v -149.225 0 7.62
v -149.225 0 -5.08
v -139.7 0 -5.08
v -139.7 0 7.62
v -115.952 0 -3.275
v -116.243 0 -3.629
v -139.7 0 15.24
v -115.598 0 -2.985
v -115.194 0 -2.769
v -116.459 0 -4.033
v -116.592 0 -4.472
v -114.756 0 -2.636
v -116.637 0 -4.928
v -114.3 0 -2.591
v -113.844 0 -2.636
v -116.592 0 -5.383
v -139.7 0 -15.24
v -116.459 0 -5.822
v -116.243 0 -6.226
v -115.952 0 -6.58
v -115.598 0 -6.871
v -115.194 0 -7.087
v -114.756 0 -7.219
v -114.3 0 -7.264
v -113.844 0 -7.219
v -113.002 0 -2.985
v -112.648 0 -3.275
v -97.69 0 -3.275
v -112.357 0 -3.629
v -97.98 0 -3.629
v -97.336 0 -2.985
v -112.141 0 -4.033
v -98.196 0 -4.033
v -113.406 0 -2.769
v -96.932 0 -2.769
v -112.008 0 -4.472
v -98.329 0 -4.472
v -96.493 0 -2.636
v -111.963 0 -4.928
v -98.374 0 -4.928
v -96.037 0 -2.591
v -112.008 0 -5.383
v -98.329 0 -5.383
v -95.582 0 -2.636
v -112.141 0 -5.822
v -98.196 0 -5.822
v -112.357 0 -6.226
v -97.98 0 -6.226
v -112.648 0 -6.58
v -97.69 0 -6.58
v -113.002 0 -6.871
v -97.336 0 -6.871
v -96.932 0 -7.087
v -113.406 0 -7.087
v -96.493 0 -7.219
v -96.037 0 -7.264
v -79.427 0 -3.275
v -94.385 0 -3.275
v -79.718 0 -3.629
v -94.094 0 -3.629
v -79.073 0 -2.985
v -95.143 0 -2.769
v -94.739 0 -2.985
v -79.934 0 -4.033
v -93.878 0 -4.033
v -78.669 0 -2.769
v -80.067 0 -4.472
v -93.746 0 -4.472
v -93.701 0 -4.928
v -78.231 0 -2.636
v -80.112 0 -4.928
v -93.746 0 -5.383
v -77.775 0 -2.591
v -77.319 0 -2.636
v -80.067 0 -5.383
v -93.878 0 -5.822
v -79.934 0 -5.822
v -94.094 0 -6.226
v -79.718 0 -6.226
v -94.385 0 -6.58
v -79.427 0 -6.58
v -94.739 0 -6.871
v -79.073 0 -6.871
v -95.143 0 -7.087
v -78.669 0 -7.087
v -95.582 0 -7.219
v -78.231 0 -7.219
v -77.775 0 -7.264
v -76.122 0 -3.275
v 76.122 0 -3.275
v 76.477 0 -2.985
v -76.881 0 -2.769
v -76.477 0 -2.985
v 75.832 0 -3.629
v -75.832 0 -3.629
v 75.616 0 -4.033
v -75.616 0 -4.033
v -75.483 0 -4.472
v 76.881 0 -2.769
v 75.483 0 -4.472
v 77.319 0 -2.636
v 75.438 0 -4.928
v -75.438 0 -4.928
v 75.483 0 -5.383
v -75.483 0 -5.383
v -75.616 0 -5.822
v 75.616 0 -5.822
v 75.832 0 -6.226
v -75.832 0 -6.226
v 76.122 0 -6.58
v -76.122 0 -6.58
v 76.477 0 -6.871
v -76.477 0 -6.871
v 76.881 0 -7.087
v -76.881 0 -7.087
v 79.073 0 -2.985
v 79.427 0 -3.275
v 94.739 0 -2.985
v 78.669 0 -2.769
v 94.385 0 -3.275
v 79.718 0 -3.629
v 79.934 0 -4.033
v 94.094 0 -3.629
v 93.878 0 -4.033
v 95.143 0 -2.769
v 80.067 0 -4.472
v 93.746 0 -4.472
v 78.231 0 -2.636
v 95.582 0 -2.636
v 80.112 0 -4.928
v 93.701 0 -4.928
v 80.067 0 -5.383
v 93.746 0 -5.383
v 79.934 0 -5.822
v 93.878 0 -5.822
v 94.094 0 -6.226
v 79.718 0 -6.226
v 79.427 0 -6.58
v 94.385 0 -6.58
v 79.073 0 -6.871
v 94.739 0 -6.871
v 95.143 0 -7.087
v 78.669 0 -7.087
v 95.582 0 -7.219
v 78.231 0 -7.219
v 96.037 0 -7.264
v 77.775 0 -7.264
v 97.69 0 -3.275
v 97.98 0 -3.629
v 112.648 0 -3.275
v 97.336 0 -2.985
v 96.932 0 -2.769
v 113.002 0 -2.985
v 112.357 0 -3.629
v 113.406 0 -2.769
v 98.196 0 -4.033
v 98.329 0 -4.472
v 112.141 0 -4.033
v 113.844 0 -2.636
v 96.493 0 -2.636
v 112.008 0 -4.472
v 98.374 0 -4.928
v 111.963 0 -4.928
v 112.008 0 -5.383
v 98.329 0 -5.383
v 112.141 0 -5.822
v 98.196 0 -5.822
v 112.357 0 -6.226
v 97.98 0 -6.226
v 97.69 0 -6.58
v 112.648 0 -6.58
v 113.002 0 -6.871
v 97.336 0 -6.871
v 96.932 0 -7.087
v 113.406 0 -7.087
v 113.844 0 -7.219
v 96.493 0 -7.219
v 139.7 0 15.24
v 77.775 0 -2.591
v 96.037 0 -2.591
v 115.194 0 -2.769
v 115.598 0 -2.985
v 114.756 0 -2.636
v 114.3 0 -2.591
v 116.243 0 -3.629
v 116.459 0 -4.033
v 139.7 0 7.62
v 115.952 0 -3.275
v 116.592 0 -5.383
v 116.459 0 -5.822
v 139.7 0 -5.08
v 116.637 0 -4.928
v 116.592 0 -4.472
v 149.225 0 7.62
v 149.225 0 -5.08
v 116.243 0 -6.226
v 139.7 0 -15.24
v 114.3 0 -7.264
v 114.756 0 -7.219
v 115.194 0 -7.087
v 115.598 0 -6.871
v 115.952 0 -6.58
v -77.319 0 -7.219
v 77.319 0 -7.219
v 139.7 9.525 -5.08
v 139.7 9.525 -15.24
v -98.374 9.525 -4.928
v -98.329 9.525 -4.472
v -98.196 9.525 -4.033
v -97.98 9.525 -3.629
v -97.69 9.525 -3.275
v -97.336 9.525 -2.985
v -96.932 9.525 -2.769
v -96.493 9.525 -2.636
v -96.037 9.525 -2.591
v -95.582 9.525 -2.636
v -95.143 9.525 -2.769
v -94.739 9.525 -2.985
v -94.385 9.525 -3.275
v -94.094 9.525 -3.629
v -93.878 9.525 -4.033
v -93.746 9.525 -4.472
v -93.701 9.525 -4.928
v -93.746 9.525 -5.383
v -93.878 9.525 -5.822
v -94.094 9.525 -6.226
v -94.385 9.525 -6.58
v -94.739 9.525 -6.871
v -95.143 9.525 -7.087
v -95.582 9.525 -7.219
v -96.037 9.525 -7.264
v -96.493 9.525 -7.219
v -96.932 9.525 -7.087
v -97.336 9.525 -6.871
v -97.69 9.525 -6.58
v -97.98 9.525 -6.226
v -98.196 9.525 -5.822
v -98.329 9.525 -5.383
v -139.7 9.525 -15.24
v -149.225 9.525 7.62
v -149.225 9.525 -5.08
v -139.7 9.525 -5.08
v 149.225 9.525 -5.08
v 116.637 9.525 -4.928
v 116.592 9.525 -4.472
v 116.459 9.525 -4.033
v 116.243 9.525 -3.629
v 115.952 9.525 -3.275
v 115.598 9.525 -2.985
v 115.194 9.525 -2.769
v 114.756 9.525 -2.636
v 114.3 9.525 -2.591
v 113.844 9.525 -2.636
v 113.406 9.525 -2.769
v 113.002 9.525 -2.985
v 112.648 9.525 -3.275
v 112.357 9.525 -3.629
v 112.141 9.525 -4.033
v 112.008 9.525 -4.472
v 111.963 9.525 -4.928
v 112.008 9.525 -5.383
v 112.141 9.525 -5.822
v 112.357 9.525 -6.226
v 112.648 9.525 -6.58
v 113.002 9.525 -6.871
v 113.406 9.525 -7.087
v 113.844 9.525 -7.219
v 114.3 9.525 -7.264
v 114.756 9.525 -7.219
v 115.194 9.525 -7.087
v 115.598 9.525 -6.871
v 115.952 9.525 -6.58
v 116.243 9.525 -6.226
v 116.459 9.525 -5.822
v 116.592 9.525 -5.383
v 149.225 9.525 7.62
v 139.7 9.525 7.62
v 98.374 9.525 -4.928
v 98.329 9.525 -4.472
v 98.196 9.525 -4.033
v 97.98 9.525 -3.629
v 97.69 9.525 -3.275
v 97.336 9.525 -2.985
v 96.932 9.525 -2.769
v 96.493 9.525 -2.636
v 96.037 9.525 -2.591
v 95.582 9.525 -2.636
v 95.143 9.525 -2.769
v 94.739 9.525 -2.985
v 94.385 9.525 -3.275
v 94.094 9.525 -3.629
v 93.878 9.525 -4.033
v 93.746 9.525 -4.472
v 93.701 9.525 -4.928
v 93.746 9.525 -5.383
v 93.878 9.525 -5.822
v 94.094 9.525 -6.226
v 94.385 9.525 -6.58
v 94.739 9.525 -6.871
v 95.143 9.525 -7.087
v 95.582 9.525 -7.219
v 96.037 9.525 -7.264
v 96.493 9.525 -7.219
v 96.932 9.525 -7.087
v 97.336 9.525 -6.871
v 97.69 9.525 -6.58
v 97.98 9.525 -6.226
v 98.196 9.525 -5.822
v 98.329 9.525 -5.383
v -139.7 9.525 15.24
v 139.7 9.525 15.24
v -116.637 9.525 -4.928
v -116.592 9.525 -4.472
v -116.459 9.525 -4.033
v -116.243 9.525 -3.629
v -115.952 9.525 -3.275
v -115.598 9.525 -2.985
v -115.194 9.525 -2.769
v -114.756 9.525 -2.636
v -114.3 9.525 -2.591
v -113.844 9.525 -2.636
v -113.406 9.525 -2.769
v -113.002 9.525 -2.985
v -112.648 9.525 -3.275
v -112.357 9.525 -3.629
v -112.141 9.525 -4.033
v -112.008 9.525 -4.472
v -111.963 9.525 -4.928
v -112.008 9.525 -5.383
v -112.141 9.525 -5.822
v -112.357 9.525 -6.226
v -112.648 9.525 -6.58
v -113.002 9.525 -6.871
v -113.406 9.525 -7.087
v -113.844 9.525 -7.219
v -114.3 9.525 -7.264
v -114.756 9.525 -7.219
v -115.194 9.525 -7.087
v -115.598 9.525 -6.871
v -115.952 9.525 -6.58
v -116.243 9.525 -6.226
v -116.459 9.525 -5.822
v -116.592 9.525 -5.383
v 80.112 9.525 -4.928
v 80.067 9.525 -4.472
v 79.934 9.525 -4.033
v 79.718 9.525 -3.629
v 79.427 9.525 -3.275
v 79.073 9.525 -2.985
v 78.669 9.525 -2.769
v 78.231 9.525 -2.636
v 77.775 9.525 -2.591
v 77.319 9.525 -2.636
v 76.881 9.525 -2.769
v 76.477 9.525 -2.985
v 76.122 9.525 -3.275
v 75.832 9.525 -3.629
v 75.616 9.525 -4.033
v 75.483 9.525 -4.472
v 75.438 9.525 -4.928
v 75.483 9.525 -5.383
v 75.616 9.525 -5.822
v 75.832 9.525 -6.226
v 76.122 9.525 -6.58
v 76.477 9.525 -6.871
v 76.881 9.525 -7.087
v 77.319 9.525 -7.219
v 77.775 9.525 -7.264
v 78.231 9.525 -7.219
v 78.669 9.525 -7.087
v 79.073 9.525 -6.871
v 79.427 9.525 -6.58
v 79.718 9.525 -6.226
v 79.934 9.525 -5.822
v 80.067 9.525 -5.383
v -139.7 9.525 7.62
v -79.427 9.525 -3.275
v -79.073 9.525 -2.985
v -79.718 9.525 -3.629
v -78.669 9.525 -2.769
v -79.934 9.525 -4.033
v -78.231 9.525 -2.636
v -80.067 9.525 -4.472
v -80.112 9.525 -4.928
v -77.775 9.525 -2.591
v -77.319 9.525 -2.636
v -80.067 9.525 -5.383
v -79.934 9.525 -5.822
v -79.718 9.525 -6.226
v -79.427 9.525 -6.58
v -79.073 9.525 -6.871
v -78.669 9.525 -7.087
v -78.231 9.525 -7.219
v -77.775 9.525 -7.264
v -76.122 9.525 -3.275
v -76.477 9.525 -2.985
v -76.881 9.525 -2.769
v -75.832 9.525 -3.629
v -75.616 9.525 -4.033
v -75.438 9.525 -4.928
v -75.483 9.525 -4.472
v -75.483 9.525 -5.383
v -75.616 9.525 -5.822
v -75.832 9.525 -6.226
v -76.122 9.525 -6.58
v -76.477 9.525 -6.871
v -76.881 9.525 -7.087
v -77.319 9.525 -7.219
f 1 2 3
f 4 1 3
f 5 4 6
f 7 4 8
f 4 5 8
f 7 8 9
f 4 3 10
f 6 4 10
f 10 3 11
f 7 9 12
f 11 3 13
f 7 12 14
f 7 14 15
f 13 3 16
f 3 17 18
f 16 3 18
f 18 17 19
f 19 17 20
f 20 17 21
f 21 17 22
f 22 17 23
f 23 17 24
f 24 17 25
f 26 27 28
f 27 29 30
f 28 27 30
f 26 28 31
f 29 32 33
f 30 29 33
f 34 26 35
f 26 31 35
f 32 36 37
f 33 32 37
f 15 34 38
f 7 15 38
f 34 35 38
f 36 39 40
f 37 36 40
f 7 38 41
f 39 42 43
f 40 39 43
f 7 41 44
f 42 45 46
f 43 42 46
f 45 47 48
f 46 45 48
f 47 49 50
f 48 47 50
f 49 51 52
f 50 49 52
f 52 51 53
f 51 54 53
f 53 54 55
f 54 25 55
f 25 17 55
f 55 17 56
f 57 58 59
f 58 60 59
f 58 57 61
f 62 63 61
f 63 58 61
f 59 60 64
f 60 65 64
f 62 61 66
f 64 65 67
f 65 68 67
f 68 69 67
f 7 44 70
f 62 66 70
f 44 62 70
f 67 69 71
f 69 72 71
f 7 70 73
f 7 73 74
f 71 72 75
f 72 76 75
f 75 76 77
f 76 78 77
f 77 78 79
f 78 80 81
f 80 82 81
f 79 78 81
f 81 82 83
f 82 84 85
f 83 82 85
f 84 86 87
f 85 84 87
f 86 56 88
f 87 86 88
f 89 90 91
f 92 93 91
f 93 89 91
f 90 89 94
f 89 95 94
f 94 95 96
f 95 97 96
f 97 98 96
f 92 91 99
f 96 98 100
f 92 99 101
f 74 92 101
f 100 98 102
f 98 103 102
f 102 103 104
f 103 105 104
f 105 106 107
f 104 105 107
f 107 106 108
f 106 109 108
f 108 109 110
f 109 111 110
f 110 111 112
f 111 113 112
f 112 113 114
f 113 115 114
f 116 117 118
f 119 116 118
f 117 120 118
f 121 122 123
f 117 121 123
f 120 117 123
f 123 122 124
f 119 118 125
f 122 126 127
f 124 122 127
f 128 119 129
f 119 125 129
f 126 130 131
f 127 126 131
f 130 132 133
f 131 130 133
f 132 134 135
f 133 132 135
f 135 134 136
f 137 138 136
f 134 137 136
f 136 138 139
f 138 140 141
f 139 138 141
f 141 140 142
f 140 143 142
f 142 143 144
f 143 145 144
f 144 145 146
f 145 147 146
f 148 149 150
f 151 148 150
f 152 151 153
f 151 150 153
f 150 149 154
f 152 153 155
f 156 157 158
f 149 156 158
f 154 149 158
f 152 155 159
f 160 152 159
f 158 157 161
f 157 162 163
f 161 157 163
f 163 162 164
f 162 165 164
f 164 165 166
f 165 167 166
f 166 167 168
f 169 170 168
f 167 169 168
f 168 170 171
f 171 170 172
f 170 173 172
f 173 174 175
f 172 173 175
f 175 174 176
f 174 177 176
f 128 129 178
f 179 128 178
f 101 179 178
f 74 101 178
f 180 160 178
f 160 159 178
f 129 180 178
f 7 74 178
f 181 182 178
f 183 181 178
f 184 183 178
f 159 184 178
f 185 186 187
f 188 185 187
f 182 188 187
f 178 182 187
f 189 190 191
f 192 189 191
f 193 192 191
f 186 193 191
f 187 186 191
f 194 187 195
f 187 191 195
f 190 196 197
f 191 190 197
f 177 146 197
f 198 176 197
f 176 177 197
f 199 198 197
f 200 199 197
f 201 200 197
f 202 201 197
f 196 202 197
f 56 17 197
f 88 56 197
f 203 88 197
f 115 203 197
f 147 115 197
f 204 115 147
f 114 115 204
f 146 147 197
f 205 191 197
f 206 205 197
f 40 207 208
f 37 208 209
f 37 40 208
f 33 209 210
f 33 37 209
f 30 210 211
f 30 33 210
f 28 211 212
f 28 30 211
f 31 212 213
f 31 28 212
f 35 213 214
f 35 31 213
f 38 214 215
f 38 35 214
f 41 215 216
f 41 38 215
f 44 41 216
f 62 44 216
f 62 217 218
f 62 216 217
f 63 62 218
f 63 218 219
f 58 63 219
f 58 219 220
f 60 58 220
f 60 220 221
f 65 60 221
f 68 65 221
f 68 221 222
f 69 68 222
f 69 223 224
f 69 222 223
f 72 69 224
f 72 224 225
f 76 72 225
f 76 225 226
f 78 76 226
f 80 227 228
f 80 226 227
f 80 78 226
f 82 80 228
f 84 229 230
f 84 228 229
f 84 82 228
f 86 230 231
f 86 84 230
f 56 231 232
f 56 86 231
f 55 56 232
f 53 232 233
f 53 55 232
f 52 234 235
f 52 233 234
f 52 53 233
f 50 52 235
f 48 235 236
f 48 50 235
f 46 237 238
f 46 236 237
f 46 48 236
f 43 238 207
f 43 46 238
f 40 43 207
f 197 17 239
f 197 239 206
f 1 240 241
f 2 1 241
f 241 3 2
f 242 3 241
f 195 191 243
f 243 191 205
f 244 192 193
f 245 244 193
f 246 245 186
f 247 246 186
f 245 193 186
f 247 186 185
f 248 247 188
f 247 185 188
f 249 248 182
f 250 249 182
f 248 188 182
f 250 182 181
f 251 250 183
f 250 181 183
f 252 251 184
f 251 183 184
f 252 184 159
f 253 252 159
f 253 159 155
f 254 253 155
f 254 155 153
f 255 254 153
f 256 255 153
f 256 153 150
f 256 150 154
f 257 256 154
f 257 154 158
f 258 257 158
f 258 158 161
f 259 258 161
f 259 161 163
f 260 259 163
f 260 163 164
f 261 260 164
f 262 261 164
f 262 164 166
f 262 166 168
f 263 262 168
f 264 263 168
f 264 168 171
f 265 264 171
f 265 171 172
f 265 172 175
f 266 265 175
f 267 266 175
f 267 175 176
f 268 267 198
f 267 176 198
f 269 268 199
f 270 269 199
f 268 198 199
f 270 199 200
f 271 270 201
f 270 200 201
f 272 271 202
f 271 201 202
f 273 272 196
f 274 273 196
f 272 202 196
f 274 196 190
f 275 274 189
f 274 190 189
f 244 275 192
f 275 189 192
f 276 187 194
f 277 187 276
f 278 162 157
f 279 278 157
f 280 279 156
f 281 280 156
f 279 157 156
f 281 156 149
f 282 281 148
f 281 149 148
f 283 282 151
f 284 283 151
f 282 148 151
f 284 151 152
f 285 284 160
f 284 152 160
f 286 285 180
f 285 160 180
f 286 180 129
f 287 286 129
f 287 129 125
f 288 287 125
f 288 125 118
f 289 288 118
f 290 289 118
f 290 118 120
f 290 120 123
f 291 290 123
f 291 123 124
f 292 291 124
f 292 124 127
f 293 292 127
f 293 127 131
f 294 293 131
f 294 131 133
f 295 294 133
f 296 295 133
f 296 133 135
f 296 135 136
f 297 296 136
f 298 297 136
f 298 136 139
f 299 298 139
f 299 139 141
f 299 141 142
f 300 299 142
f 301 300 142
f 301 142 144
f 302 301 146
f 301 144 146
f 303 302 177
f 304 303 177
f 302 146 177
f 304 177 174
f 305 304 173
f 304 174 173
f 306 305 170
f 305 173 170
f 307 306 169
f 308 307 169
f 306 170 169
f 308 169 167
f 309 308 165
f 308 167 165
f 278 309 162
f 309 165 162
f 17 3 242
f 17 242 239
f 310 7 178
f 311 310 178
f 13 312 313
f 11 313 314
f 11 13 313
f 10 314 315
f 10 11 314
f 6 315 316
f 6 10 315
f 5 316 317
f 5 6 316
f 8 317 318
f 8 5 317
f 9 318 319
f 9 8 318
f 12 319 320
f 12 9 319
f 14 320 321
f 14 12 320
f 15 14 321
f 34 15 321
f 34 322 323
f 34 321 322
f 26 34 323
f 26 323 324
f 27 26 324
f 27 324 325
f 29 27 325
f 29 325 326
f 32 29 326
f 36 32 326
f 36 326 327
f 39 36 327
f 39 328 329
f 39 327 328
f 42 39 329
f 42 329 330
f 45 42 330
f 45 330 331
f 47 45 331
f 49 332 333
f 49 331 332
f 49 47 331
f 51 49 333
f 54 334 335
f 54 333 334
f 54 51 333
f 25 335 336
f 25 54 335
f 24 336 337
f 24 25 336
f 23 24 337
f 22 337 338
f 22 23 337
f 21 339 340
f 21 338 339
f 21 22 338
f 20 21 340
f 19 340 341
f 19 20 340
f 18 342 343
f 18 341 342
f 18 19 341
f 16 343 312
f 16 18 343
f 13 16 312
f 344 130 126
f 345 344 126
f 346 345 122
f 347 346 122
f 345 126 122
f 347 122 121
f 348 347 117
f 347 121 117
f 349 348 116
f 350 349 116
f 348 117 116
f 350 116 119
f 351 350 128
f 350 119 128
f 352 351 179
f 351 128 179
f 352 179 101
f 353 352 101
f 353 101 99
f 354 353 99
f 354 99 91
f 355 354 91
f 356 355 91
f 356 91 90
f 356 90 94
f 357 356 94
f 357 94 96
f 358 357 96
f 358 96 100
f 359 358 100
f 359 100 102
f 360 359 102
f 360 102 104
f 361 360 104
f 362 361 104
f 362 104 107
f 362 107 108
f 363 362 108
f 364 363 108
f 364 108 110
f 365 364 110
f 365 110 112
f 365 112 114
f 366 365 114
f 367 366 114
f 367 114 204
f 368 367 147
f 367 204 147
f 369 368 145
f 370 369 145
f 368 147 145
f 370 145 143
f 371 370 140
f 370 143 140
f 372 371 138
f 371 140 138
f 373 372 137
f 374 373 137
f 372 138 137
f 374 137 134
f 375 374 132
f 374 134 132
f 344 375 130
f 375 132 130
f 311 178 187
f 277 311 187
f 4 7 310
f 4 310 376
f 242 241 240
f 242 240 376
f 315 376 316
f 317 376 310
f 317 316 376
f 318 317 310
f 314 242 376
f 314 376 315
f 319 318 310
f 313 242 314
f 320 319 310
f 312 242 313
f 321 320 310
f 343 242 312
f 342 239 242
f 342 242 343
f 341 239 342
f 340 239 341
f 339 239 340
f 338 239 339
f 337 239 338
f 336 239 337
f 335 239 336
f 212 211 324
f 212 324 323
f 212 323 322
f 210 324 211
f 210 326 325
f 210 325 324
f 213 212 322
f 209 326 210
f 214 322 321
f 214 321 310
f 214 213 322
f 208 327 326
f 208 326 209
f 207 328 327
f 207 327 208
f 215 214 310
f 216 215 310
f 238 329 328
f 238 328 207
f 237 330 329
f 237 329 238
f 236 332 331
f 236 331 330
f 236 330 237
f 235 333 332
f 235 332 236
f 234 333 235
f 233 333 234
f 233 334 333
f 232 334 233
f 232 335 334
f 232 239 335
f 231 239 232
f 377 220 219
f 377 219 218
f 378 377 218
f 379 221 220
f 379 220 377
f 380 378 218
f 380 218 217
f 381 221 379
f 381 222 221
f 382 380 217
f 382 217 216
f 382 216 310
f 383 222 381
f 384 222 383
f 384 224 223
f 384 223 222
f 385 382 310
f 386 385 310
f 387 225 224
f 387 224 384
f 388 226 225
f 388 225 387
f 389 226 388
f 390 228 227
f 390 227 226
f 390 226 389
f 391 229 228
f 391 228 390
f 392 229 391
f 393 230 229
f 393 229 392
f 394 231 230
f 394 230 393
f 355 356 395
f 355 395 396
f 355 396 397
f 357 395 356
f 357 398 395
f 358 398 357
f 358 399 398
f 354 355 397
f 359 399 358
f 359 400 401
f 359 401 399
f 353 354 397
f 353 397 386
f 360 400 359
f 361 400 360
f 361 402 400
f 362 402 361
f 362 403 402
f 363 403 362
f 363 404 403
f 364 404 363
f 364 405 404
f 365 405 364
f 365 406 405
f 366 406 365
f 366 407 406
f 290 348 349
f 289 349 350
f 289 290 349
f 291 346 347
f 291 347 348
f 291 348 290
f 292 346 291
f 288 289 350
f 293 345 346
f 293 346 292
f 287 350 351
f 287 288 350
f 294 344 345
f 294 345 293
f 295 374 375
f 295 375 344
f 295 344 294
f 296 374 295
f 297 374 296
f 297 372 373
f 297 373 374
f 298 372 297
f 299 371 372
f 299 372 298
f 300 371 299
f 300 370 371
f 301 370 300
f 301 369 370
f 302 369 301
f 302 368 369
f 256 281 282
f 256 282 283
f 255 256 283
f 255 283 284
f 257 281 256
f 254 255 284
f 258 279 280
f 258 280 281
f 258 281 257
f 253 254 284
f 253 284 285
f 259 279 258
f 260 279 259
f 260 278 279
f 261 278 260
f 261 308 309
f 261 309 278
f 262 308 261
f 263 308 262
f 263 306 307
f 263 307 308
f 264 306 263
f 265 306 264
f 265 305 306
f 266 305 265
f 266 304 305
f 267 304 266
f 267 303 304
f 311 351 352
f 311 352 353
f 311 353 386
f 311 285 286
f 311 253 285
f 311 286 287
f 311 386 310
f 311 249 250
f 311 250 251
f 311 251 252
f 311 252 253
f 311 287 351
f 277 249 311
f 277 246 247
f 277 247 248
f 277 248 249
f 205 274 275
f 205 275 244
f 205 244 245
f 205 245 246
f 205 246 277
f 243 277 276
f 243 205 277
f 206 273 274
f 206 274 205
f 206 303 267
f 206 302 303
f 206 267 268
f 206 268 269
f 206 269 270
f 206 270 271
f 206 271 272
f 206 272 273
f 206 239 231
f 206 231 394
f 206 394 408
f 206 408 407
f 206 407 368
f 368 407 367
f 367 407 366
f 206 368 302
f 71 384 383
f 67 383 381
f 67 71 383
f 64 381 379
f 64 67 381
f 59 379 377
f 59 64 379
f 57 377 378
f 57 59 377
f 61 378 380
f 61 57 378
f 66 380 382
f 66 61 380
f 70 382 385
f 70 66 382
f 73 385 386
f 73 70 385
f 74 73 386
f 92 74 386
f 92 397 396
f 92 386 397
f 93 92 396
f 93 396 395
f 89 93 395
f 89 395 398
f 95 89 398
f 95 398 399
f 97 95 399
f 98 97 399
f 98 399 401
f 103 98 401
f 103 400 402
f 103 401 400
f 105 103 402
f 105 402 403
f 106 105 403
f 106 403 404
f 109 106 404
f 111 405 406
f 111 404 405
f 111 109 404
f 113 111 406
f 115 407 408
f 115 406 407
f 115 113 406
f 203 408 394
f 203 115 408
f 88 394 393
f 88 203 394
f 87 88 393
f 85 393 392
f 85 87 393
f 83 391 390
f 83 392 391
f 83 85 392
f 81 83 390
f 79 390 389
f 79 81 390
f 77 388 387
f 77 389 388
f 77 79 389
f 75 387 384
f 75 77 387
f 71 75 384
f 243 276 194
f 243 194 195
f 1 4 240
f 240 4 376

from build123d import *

# Parameters (mm, degrees)
SKETCH1_W           = 279.4
SKETCH1_H           = 30.48
BOSS_EXTRUDE1_DEPTH = 9.525
SKETCH2_W           = 12.7
SKETCH2_H           = 9.525
BOSS_EXTRUDE2_DEPTH = 9.525
SKETCH3_R           = 2.3368
CUT_EXTRUDE1_DEPTH  = 10.525


with BuildPart() as part:
    # Sketch1 → Boss-Extrude1 (new body)
    with BuildSketch(Plane(origin=(0, 0, 0), x_dir=(1, 0, 0), z_dir=(0, 1, 0))):
        Rectangle(SKETCH1_W, SKETCH1_H)
    extrude(amount=BOSS_EXTRUDE1_DEPTH)

    # Sketch2 → Boss-Extrude2 (add)
    with BuildSketch(Plane(origin=(139.7, 0, 0), x_dir=(0, 0, -1), z_dir=(1, 0, 0))):
        with Locations((-1.27, 4.7625)):
            Rectangle(SKETCH2_W, SKETCH2_H)
    boss_extrude2 = extrude(amount=BOSS_EXTRUDE2_DEPTH)

    # Mirror1: Boss-Extrude2 across plane
    add(boss_extrude2.mirror(Plane(origin=(0, 0, 0), x_dir=(0, 0, 1), z_dir=(1, 0, 0))))

    # Sketch3 → Cut-Extrude1 (cut, through all)
    with BuildSketch(Plane.XZ):
        with Locations((114.3, -4.9276)):
            Circle(SKETCH3_R)
        with Locations((77.7748, -4.9276)):
            Circle(SKETCH3_R)
        with Locations((96.0374, -4.9276)):
            Circle(SKETCH3_R)
    cut_extrude1 = extrude(amount=-CUT_EXTRUDE1_DEPTH, mode=Mode.SUBTRACT)

    # Mirror2: Cut-Extrude1 across plane
    add(cut_extrude1.mirror(Plane(origin=(0, 0, 0), x_dir=(0, 0, 1), z_dir=(1, 0, 0))), mode=Mode.SUBTRACT)


solid = part.part
